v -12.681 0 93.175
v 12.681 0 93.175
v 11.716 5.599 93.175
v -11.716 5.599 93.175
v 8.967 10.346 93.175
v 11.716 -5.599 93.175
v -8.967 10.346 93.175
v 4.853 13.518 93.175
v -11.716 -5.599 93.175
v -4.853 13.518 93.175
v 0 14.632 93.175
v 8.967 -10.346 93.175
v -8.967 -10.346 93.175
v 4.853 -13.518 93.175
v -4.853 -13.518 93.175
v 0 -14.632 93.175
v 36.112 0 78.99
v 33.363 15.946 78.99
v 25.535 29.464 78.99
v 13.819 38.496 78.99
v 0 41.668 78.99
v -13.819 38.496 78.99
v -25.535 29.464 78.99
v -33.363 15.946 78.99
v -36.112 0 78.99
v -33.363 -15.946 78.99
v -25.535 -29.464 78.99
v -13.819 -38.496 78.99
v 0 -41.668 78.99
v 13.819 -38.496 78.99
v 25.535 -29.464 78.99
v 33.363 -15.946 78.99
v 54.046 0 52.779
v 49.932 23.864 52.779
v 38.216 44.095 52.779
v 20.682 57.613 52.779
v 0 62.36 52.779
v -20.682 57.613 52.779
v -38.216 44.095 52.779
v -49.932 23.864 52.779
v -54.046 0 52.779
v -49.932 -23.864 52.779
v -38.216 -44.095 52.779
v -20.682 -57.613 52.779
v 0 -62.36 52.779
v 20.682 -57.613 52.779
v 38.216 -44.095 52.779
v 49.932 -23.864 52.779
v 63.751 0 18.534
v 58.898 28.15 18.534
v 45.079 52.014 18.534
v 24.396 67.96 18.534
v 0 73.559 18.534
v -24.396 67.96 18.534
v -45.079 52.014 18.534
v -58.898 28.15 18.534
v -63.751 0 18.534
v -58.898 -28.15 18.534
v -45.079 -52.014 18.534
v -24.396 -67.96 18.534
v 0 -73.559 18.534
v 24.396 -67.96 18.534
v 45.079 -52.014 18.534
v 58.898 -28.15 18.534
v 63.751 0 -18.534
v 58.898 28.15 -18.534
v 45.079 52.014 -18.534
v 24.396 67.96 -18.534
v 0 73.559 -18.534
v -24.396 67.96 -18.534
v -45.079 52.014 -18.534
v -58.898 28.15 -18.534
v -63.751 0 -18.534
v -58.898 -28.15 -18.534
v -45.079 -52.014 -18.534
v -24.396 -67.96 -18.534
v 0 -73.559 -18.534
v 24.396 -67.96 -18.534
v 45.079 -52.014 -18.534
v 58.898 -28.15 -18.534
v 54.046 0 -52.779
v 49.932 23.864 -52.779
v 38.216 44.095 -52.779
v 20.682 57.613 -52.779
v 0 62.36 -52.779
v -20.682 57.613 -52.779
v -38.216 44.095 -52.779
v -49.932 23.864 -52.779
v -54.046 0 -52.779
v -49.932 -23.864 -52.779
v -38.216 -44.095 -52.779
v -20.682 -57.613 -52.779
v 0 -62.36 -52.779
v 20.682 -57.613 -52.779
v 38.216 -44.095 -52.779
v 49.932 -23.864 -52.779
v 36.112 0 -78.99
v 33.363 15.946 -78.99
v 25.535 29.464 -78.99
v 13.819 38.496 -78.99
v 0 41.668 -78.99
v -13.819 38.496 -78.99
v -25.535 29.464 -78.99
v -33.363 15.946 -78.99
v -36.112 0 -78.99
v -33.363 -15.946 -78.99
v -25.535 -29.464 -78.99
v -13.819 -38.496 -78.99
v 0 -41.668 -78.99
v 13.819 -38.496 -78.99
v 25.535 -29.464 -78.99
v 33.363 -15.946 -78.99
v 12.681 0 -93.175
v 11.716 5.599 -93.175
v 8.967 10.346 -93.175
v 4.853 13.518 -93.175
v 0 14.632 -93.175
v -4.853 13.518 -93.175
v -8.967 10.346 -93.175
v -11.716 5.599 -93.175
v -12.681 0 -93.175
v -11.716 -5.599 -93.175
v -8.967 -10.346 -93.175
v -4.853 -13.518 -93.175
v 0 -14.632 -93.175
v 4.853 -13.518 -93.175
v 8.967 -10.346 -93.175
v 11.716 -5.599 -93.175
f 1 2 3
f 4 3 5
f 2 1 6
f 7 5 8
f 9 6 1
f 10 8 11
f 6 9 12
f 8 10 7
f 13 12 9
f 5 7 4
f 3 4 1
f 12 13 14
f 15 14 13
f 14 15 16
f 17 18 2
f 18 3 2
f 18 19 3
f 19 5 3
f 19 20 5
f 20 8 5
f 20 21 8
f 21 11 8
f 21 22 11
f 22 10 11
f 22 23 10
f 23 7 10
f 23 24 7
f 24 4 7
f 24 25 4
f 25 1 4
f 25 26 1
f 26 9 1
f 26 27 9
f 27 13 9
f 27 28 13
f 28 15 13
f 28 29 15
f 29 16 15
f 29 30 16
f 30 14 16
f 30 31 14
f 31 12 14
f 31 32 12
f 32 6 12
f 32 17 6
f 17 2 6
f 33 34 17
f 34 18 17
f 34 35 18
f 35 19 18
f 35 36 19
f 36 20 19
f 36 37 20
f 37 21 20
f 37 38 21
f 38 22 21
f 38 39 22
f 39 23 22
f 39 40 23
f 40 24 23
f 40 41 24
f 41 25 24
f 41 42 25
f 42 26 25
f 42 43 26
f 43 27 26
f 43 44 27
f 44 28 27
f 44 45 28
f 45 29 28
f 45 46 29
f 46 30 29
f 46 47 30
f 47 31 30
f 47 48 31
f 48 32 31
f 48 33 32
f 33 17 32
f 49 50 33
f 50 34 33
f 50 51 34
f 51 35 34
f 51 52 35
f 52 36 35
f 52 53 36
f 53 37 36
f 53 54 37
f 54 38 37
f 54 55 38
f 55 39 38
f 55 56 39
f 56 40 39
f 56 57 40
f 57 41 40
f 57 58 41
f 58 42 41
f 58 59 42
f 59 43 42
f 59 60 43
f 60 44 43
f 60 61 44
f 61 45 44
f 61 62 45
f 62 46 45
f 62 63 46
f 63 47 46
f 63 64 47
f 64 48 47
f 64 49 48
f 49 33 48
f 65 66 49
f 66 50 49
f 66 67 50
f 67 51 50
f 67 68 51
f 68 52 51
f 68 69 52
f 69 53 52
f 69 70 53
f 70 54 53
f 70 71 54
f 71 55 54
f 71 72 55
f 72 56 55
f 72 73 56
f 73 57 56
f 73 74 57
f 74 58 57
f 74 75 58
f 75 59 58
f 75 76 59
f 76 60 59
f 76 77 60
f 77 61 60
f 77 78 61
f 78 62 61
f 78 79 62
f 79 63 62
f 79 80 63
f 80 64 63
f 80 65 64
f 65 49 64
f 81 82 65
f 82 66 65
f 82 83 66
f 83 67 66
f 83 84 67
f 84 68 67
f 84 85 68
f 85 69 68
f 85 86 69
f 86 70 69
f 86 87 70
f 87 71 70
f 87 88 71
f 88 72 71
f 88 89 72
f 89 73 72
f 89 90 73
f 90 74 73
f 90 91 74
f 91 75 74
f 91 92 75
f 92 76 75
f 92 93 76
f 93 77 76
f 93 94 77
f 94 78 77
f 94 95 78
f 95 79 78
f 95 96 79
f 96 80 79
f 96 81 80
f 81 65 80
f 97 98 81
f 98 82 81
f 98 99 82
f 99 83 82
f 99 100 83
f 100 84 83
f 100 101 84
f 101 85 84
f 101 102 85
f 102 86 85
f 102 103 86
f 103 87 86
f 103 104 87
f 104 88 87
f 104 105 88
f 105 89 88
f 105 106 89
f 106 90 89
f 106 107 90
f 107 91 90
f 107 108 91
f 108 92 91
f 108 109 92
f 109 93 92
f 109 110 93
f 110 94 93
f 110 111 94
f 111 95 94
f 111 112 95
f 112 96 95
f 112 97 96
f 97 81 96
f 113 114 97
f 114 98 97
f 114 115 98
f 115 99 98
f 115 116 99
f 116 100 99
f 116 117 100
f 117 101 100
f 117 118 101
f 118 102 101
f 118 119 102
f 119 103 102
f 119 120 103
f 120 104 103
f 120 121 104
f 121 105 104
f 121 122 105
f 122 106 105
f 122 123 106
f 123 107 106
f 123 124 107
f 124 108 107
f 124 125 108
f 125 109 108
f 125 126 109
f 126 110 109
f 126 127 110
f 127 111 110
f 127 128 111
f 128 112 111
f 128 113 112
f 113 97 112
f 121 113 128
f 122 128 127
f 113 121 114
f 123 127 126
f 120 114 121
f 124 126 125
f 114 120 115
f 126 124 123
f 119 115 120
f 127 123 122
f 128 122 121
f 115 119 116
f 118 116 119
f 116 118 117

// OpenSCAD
// Generated by SolidPython 1.0.1 on 2020-07-29 00:46:51


scale(v = [13, 15, 19]) {
	sphere(r = 5);
}
/***********************************************
*********      SolidPython code:      **********
************************************************
 
# import packages: SolidPython
from solid import *
from solid.utils import *
from itertools import chain, combinations, permutations


class Resize:

    def __init__(self, scad_file):
        self.scad_file = scad_file
        #self.scad_file = import_scad(scad_file)
        # cone/cylinder param:
        self.r1 = 0
        self.r2 = 0
        self.h = 0
        # rectangular prism param:
        self.w = 0
        self.l = 0
        # ellipse param:
        self.r = 0

    # import OpenScad code (file name corresponds to shape)


    # classify shape + parameters
    def assign(self, param1, param2, param3):
        if self.scad_file == 'cone.scad':
            self.r1 = param1
            self.r2 = param2
            self.h = param3
        elif self.scad_file == 'cylinder.scad':
            self.r1 = param1
            self.r2 = param2
            self.h = param3
        elif self.scad_file == 'rectangularPrism.scad':
            self.h = param1
            self.l = param2
            self.w = param3
        else:
            self.r = param1
            self.h = param2

    # resize parameters
    def iterate(self):
        x = range(3, 20, 2)
        i = 1
        if self.scad_file == 'cone.scad':
            tempList = list(permutations(x, 2))
            for temp in tempList:
                param1 = temp[0]
                param2 = temp[1]
                filepath = 'produced_scad_files/' + 'cone' + str(param1) + '_' + str(param2) + '_' + '.scad'
                scad_render_to_file(cylinder(h=param1, r1=param2, r2=0), filepath)

        elif self.scad_file == 'cylinder.scad':
            tempList = list(permutations(x, 3))
            for temp in tempList:
                param1 = temp[0]
                param2 = temp[1]
                filepath = 'produced_scad_files/' + 'cylinder' + str(param1) + '_' + str(param2) + '_' + '.scad'
                scad_render_to_file(cylinder(h=param1, r1=param2, r2=param2), filepath)

        elif self.scad_file == 'rectangularPrism.scad':
            tempList = list(permutations(x, 3))
            for temp in tempList:
                param1 = temp[0]
                param2 = temp[1]
                param3 = temp[2]
                filepath = 'produced_scad_files/' + 'rectangularPrism' + str(param1) + '_' + str(param2) + '_' + str(
                    param3) + '.scad'
                scad_render_to_file(cube(size=(param1, param2, param3)), filepath)

        elif self.scad_file == 'ellipse.scad':
            tempList = list(permutations(x, 4))
            for temp in tempList:
                param1 = temp[0]
                param2 = temp[1]
                param3 = temp[2]
                param4 = temp[3]
                filepath = 'produced_scad_files/' + 'ellipse' + str(param1) + '_' + str(param2) + '_' + str(param3) + '_' + str(param4) + '.scad'
                scad_render_to_file(scale([param1, param2, param3])(sphere(r=param4)), filepath)

    def render_to_scadfile(self):
        scad_render_to_file(scad, 'example.scad') 
 
************************************************/
